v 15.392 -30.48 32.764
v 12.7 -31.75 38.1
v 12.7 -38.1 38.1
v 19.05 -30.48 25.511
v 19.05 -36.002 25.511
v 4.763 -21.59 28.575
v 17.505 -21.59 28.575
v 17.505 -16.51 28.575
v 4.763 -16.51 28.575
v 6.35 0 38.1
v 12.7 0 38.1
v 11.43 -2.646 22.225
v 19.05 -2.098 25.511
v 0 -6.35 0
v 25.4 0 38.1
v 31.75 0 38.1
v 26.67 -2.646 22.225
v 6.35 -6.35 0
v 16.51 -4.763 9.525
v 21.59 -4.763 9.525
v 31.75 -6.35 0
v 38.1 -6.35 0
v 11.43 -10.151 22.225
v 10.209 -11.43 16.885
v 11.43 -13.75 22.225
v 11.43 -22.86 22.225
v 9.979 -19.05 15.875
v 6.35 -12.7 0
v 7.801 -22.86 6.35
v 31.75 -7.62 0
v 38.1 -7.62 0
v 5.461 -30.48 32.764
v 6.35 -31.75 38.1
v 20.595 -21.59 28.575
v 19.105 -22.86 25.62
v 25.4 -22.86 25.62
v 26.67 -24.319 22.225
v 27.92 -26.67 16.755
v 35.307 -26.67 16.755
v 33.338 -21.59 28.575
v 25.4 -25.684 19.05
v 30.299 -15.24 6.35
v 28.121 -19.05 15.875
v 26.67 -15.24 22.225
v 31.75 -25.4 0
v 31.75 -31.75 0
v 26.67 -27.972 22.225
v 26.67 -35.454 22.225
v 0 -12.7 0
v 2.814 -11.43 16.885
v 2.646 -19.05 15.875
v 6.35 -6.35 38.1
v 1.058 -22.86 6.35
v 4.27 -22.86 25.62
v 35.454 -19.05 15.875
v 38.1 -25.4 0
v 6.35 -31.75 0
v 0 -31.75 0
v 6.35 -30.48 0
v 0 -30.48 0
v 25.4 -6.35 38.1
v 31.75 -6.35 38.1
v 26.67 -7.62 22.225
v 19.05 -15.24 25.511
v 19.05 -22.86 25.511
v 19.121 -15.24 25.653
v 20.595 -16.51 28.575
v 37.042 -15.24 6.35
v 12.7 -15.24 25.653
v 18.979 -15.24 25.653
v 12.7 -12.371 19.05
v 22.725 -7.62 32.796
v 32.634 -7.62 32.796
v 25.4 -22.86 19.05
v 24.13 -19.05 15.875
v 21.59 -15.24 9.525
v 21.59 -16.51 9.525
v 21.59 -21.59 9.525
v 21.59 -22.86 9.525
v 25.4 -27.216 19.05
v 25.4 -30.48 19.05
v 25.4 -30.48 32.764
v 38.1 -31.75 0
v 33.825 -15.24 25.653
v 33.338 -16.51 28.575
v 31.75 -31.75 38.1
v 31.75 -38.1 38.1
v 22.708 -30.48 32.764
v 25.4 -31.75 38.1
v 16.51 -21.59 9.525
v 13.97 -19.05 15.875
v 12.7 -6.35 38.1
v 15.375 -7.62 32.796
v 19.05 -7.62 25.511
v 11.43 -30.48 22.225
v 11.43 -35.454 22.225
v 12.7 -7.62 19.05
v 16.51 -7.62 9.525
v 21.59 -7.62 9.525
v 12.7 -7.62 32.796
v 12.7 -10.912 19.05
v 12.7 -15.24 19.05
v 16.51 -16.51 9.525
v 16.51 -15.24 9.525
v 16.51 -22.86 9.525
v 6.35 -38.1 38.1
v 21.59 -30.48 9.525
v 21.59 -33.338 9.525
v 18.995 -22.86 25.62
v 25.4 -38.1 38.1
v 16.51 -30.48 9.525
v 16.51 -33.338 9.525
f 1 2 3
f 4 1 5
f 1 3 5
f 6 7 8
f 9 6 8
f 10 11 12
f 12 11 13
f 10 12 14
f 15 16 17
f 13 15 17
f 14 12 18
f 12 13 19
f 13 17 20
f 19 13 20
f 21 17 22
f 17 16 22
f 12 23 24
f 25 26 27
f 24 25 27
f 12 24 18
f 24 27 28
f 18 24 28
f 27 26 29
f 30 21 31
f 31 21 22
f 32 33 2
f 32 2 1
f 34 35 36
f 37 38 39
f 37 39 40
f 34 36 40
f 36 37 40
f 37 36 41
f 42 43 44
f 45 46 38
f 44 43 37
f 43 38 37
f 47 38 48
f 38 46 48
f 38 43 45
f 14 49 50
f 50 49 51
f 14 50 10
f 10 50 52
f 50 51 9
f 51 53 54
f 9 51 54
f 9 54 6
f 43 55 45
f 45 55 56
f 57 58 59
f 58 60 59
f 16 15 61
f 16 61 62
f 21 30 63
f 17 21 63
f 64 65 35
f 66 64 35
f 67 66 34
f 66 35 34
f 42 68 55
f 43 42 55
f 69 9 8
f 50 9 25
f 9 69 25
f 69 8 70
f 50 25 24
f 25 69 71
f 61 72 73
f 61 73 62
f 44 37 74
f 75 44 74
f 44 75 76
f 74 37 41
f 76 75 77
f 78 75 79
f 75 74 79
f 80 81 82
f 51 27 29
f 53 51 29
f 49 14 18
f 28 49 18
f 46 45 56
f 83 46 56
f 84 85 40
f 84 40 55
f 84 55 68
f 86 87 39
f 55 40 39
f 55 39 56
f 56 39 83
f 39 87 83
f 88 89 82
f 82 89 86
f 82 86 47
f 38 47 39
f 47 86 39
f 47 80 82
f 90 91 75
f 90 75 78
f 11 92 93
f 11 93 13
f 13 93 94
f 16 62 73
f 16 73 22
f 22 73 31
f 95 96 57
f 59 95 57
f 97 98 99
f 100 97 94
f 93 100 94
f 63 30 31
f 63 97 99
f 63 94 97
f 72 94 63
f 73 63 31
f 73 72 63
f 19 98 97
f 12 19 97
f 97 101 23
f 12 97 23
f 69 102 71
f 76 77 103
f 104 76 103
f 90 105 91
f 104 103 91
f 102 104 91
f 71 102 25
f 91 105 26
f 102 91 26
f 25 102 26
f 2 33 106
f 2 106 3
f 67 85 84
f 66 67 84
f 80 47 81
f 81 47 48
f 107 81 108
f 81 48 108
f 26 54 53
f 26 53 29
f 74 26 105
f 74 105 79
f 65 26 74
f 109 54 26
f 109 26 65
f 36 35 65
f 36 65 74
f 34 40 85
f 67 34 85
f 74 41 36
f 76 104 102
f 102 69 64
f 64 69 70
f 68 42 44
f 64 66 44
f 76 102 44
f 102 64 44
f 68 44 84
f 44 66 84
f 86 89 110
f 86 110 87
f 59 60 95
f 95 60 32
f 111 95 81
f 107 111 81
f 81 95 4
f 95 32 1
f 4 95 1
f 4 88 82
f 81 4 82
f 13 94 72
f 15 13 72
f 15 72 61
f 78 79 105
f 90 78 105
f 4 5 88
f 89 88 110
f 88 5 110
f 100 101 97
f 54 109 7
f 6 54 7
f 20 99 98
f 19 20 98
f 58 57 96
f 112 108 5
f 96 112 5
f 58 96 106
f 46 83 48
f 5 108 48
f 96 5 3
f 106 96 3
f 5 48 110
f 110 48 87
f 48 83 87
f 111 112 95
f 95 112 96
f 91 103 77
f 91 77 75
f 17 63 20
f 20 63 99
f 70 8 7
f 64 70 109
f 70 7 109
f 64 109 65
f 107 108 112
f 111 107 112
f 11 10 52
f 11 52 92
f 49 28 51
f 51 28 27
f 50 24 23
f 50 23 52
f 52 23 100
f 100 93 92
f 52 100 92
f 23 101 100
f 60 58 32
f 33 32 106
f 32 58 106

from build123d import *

# Parameters (mm, degrees)
F0_W     = 38.1
F0_H     = 38.1
F1_DEPTH = 38.1
F5_DEPTH = 38.1
F7_DEPTH = 38.1
F8_W     = 25.4
F8_H     = 7.62
F9_DEPTH = 38.1


with BuildPart() as f1:
    # F0 (on Front) → F1 (new body)
    with BuildSketch(Plane.XZ):
        with Locations((19.05, 19.05)):
            Rectangle(F0_W, F0_H)
    extrude(amount=F1_DEPTH)

    # F4 (on face) → F5 (cut)
    with BuildSketch(Plane.YZ.offset(38.1)):
        Polygon((-6.35, 38.1), (-31.75, 38.1), (-26.67, 16.755341), (-21.59, 28.575), (-16.51, 28.575), (-11.43, 16.885228), align=None)
        Polygon((-31.75, 0), (-38.1, 38.1), (-38.1, 0), align=None)
        Polygon((-19.05, 15.875), (-25.4, 0), (-12.7, 0), align=None)
        Polygon((0, 0), (0, 38.1), (-6.35, 0), align=None)
    extrude(amount=-F5_DEPTH, mode=Mode.SUBTRACT)

    # F6 (on offset) → F7 (cut)
    with BuildSketch(Plane.XZ.offset(38.1)):
        Polygon((0, 38.1), (0, 0), (6.35, 38.1), align=None)
        Polygon((25.4, 38.1), (12.7, 38.1), (19.05, 25.511248), align=None)
        Polygon((11.43, 22.225), (6.35, 0), (31.75, 0), (26.67, 22.225), (21.59, 9.525), (16.51, 9.525), align=None)
        Polygon((31.75, 38.1), (38.1, 0), (38.1, 38.1), align=None)
    extrude(amount=-F7_DEPTH, mode=Mode.SUBTRACT)

    # F8 (on offset) → F9 (cut)
    with BuildSketch(Plane.XY.offset(38.1)):
        with Locations((25.4, -11.43)):
            Rectangle(F8_W, F8_H)
        with Locations((12.7, -26.67)):
            Rectangle(F8_W, F8_H)
    extrude(amount=-F9_DEPTH, mode=Mode.SUBTRACT)


solid = f1.part
